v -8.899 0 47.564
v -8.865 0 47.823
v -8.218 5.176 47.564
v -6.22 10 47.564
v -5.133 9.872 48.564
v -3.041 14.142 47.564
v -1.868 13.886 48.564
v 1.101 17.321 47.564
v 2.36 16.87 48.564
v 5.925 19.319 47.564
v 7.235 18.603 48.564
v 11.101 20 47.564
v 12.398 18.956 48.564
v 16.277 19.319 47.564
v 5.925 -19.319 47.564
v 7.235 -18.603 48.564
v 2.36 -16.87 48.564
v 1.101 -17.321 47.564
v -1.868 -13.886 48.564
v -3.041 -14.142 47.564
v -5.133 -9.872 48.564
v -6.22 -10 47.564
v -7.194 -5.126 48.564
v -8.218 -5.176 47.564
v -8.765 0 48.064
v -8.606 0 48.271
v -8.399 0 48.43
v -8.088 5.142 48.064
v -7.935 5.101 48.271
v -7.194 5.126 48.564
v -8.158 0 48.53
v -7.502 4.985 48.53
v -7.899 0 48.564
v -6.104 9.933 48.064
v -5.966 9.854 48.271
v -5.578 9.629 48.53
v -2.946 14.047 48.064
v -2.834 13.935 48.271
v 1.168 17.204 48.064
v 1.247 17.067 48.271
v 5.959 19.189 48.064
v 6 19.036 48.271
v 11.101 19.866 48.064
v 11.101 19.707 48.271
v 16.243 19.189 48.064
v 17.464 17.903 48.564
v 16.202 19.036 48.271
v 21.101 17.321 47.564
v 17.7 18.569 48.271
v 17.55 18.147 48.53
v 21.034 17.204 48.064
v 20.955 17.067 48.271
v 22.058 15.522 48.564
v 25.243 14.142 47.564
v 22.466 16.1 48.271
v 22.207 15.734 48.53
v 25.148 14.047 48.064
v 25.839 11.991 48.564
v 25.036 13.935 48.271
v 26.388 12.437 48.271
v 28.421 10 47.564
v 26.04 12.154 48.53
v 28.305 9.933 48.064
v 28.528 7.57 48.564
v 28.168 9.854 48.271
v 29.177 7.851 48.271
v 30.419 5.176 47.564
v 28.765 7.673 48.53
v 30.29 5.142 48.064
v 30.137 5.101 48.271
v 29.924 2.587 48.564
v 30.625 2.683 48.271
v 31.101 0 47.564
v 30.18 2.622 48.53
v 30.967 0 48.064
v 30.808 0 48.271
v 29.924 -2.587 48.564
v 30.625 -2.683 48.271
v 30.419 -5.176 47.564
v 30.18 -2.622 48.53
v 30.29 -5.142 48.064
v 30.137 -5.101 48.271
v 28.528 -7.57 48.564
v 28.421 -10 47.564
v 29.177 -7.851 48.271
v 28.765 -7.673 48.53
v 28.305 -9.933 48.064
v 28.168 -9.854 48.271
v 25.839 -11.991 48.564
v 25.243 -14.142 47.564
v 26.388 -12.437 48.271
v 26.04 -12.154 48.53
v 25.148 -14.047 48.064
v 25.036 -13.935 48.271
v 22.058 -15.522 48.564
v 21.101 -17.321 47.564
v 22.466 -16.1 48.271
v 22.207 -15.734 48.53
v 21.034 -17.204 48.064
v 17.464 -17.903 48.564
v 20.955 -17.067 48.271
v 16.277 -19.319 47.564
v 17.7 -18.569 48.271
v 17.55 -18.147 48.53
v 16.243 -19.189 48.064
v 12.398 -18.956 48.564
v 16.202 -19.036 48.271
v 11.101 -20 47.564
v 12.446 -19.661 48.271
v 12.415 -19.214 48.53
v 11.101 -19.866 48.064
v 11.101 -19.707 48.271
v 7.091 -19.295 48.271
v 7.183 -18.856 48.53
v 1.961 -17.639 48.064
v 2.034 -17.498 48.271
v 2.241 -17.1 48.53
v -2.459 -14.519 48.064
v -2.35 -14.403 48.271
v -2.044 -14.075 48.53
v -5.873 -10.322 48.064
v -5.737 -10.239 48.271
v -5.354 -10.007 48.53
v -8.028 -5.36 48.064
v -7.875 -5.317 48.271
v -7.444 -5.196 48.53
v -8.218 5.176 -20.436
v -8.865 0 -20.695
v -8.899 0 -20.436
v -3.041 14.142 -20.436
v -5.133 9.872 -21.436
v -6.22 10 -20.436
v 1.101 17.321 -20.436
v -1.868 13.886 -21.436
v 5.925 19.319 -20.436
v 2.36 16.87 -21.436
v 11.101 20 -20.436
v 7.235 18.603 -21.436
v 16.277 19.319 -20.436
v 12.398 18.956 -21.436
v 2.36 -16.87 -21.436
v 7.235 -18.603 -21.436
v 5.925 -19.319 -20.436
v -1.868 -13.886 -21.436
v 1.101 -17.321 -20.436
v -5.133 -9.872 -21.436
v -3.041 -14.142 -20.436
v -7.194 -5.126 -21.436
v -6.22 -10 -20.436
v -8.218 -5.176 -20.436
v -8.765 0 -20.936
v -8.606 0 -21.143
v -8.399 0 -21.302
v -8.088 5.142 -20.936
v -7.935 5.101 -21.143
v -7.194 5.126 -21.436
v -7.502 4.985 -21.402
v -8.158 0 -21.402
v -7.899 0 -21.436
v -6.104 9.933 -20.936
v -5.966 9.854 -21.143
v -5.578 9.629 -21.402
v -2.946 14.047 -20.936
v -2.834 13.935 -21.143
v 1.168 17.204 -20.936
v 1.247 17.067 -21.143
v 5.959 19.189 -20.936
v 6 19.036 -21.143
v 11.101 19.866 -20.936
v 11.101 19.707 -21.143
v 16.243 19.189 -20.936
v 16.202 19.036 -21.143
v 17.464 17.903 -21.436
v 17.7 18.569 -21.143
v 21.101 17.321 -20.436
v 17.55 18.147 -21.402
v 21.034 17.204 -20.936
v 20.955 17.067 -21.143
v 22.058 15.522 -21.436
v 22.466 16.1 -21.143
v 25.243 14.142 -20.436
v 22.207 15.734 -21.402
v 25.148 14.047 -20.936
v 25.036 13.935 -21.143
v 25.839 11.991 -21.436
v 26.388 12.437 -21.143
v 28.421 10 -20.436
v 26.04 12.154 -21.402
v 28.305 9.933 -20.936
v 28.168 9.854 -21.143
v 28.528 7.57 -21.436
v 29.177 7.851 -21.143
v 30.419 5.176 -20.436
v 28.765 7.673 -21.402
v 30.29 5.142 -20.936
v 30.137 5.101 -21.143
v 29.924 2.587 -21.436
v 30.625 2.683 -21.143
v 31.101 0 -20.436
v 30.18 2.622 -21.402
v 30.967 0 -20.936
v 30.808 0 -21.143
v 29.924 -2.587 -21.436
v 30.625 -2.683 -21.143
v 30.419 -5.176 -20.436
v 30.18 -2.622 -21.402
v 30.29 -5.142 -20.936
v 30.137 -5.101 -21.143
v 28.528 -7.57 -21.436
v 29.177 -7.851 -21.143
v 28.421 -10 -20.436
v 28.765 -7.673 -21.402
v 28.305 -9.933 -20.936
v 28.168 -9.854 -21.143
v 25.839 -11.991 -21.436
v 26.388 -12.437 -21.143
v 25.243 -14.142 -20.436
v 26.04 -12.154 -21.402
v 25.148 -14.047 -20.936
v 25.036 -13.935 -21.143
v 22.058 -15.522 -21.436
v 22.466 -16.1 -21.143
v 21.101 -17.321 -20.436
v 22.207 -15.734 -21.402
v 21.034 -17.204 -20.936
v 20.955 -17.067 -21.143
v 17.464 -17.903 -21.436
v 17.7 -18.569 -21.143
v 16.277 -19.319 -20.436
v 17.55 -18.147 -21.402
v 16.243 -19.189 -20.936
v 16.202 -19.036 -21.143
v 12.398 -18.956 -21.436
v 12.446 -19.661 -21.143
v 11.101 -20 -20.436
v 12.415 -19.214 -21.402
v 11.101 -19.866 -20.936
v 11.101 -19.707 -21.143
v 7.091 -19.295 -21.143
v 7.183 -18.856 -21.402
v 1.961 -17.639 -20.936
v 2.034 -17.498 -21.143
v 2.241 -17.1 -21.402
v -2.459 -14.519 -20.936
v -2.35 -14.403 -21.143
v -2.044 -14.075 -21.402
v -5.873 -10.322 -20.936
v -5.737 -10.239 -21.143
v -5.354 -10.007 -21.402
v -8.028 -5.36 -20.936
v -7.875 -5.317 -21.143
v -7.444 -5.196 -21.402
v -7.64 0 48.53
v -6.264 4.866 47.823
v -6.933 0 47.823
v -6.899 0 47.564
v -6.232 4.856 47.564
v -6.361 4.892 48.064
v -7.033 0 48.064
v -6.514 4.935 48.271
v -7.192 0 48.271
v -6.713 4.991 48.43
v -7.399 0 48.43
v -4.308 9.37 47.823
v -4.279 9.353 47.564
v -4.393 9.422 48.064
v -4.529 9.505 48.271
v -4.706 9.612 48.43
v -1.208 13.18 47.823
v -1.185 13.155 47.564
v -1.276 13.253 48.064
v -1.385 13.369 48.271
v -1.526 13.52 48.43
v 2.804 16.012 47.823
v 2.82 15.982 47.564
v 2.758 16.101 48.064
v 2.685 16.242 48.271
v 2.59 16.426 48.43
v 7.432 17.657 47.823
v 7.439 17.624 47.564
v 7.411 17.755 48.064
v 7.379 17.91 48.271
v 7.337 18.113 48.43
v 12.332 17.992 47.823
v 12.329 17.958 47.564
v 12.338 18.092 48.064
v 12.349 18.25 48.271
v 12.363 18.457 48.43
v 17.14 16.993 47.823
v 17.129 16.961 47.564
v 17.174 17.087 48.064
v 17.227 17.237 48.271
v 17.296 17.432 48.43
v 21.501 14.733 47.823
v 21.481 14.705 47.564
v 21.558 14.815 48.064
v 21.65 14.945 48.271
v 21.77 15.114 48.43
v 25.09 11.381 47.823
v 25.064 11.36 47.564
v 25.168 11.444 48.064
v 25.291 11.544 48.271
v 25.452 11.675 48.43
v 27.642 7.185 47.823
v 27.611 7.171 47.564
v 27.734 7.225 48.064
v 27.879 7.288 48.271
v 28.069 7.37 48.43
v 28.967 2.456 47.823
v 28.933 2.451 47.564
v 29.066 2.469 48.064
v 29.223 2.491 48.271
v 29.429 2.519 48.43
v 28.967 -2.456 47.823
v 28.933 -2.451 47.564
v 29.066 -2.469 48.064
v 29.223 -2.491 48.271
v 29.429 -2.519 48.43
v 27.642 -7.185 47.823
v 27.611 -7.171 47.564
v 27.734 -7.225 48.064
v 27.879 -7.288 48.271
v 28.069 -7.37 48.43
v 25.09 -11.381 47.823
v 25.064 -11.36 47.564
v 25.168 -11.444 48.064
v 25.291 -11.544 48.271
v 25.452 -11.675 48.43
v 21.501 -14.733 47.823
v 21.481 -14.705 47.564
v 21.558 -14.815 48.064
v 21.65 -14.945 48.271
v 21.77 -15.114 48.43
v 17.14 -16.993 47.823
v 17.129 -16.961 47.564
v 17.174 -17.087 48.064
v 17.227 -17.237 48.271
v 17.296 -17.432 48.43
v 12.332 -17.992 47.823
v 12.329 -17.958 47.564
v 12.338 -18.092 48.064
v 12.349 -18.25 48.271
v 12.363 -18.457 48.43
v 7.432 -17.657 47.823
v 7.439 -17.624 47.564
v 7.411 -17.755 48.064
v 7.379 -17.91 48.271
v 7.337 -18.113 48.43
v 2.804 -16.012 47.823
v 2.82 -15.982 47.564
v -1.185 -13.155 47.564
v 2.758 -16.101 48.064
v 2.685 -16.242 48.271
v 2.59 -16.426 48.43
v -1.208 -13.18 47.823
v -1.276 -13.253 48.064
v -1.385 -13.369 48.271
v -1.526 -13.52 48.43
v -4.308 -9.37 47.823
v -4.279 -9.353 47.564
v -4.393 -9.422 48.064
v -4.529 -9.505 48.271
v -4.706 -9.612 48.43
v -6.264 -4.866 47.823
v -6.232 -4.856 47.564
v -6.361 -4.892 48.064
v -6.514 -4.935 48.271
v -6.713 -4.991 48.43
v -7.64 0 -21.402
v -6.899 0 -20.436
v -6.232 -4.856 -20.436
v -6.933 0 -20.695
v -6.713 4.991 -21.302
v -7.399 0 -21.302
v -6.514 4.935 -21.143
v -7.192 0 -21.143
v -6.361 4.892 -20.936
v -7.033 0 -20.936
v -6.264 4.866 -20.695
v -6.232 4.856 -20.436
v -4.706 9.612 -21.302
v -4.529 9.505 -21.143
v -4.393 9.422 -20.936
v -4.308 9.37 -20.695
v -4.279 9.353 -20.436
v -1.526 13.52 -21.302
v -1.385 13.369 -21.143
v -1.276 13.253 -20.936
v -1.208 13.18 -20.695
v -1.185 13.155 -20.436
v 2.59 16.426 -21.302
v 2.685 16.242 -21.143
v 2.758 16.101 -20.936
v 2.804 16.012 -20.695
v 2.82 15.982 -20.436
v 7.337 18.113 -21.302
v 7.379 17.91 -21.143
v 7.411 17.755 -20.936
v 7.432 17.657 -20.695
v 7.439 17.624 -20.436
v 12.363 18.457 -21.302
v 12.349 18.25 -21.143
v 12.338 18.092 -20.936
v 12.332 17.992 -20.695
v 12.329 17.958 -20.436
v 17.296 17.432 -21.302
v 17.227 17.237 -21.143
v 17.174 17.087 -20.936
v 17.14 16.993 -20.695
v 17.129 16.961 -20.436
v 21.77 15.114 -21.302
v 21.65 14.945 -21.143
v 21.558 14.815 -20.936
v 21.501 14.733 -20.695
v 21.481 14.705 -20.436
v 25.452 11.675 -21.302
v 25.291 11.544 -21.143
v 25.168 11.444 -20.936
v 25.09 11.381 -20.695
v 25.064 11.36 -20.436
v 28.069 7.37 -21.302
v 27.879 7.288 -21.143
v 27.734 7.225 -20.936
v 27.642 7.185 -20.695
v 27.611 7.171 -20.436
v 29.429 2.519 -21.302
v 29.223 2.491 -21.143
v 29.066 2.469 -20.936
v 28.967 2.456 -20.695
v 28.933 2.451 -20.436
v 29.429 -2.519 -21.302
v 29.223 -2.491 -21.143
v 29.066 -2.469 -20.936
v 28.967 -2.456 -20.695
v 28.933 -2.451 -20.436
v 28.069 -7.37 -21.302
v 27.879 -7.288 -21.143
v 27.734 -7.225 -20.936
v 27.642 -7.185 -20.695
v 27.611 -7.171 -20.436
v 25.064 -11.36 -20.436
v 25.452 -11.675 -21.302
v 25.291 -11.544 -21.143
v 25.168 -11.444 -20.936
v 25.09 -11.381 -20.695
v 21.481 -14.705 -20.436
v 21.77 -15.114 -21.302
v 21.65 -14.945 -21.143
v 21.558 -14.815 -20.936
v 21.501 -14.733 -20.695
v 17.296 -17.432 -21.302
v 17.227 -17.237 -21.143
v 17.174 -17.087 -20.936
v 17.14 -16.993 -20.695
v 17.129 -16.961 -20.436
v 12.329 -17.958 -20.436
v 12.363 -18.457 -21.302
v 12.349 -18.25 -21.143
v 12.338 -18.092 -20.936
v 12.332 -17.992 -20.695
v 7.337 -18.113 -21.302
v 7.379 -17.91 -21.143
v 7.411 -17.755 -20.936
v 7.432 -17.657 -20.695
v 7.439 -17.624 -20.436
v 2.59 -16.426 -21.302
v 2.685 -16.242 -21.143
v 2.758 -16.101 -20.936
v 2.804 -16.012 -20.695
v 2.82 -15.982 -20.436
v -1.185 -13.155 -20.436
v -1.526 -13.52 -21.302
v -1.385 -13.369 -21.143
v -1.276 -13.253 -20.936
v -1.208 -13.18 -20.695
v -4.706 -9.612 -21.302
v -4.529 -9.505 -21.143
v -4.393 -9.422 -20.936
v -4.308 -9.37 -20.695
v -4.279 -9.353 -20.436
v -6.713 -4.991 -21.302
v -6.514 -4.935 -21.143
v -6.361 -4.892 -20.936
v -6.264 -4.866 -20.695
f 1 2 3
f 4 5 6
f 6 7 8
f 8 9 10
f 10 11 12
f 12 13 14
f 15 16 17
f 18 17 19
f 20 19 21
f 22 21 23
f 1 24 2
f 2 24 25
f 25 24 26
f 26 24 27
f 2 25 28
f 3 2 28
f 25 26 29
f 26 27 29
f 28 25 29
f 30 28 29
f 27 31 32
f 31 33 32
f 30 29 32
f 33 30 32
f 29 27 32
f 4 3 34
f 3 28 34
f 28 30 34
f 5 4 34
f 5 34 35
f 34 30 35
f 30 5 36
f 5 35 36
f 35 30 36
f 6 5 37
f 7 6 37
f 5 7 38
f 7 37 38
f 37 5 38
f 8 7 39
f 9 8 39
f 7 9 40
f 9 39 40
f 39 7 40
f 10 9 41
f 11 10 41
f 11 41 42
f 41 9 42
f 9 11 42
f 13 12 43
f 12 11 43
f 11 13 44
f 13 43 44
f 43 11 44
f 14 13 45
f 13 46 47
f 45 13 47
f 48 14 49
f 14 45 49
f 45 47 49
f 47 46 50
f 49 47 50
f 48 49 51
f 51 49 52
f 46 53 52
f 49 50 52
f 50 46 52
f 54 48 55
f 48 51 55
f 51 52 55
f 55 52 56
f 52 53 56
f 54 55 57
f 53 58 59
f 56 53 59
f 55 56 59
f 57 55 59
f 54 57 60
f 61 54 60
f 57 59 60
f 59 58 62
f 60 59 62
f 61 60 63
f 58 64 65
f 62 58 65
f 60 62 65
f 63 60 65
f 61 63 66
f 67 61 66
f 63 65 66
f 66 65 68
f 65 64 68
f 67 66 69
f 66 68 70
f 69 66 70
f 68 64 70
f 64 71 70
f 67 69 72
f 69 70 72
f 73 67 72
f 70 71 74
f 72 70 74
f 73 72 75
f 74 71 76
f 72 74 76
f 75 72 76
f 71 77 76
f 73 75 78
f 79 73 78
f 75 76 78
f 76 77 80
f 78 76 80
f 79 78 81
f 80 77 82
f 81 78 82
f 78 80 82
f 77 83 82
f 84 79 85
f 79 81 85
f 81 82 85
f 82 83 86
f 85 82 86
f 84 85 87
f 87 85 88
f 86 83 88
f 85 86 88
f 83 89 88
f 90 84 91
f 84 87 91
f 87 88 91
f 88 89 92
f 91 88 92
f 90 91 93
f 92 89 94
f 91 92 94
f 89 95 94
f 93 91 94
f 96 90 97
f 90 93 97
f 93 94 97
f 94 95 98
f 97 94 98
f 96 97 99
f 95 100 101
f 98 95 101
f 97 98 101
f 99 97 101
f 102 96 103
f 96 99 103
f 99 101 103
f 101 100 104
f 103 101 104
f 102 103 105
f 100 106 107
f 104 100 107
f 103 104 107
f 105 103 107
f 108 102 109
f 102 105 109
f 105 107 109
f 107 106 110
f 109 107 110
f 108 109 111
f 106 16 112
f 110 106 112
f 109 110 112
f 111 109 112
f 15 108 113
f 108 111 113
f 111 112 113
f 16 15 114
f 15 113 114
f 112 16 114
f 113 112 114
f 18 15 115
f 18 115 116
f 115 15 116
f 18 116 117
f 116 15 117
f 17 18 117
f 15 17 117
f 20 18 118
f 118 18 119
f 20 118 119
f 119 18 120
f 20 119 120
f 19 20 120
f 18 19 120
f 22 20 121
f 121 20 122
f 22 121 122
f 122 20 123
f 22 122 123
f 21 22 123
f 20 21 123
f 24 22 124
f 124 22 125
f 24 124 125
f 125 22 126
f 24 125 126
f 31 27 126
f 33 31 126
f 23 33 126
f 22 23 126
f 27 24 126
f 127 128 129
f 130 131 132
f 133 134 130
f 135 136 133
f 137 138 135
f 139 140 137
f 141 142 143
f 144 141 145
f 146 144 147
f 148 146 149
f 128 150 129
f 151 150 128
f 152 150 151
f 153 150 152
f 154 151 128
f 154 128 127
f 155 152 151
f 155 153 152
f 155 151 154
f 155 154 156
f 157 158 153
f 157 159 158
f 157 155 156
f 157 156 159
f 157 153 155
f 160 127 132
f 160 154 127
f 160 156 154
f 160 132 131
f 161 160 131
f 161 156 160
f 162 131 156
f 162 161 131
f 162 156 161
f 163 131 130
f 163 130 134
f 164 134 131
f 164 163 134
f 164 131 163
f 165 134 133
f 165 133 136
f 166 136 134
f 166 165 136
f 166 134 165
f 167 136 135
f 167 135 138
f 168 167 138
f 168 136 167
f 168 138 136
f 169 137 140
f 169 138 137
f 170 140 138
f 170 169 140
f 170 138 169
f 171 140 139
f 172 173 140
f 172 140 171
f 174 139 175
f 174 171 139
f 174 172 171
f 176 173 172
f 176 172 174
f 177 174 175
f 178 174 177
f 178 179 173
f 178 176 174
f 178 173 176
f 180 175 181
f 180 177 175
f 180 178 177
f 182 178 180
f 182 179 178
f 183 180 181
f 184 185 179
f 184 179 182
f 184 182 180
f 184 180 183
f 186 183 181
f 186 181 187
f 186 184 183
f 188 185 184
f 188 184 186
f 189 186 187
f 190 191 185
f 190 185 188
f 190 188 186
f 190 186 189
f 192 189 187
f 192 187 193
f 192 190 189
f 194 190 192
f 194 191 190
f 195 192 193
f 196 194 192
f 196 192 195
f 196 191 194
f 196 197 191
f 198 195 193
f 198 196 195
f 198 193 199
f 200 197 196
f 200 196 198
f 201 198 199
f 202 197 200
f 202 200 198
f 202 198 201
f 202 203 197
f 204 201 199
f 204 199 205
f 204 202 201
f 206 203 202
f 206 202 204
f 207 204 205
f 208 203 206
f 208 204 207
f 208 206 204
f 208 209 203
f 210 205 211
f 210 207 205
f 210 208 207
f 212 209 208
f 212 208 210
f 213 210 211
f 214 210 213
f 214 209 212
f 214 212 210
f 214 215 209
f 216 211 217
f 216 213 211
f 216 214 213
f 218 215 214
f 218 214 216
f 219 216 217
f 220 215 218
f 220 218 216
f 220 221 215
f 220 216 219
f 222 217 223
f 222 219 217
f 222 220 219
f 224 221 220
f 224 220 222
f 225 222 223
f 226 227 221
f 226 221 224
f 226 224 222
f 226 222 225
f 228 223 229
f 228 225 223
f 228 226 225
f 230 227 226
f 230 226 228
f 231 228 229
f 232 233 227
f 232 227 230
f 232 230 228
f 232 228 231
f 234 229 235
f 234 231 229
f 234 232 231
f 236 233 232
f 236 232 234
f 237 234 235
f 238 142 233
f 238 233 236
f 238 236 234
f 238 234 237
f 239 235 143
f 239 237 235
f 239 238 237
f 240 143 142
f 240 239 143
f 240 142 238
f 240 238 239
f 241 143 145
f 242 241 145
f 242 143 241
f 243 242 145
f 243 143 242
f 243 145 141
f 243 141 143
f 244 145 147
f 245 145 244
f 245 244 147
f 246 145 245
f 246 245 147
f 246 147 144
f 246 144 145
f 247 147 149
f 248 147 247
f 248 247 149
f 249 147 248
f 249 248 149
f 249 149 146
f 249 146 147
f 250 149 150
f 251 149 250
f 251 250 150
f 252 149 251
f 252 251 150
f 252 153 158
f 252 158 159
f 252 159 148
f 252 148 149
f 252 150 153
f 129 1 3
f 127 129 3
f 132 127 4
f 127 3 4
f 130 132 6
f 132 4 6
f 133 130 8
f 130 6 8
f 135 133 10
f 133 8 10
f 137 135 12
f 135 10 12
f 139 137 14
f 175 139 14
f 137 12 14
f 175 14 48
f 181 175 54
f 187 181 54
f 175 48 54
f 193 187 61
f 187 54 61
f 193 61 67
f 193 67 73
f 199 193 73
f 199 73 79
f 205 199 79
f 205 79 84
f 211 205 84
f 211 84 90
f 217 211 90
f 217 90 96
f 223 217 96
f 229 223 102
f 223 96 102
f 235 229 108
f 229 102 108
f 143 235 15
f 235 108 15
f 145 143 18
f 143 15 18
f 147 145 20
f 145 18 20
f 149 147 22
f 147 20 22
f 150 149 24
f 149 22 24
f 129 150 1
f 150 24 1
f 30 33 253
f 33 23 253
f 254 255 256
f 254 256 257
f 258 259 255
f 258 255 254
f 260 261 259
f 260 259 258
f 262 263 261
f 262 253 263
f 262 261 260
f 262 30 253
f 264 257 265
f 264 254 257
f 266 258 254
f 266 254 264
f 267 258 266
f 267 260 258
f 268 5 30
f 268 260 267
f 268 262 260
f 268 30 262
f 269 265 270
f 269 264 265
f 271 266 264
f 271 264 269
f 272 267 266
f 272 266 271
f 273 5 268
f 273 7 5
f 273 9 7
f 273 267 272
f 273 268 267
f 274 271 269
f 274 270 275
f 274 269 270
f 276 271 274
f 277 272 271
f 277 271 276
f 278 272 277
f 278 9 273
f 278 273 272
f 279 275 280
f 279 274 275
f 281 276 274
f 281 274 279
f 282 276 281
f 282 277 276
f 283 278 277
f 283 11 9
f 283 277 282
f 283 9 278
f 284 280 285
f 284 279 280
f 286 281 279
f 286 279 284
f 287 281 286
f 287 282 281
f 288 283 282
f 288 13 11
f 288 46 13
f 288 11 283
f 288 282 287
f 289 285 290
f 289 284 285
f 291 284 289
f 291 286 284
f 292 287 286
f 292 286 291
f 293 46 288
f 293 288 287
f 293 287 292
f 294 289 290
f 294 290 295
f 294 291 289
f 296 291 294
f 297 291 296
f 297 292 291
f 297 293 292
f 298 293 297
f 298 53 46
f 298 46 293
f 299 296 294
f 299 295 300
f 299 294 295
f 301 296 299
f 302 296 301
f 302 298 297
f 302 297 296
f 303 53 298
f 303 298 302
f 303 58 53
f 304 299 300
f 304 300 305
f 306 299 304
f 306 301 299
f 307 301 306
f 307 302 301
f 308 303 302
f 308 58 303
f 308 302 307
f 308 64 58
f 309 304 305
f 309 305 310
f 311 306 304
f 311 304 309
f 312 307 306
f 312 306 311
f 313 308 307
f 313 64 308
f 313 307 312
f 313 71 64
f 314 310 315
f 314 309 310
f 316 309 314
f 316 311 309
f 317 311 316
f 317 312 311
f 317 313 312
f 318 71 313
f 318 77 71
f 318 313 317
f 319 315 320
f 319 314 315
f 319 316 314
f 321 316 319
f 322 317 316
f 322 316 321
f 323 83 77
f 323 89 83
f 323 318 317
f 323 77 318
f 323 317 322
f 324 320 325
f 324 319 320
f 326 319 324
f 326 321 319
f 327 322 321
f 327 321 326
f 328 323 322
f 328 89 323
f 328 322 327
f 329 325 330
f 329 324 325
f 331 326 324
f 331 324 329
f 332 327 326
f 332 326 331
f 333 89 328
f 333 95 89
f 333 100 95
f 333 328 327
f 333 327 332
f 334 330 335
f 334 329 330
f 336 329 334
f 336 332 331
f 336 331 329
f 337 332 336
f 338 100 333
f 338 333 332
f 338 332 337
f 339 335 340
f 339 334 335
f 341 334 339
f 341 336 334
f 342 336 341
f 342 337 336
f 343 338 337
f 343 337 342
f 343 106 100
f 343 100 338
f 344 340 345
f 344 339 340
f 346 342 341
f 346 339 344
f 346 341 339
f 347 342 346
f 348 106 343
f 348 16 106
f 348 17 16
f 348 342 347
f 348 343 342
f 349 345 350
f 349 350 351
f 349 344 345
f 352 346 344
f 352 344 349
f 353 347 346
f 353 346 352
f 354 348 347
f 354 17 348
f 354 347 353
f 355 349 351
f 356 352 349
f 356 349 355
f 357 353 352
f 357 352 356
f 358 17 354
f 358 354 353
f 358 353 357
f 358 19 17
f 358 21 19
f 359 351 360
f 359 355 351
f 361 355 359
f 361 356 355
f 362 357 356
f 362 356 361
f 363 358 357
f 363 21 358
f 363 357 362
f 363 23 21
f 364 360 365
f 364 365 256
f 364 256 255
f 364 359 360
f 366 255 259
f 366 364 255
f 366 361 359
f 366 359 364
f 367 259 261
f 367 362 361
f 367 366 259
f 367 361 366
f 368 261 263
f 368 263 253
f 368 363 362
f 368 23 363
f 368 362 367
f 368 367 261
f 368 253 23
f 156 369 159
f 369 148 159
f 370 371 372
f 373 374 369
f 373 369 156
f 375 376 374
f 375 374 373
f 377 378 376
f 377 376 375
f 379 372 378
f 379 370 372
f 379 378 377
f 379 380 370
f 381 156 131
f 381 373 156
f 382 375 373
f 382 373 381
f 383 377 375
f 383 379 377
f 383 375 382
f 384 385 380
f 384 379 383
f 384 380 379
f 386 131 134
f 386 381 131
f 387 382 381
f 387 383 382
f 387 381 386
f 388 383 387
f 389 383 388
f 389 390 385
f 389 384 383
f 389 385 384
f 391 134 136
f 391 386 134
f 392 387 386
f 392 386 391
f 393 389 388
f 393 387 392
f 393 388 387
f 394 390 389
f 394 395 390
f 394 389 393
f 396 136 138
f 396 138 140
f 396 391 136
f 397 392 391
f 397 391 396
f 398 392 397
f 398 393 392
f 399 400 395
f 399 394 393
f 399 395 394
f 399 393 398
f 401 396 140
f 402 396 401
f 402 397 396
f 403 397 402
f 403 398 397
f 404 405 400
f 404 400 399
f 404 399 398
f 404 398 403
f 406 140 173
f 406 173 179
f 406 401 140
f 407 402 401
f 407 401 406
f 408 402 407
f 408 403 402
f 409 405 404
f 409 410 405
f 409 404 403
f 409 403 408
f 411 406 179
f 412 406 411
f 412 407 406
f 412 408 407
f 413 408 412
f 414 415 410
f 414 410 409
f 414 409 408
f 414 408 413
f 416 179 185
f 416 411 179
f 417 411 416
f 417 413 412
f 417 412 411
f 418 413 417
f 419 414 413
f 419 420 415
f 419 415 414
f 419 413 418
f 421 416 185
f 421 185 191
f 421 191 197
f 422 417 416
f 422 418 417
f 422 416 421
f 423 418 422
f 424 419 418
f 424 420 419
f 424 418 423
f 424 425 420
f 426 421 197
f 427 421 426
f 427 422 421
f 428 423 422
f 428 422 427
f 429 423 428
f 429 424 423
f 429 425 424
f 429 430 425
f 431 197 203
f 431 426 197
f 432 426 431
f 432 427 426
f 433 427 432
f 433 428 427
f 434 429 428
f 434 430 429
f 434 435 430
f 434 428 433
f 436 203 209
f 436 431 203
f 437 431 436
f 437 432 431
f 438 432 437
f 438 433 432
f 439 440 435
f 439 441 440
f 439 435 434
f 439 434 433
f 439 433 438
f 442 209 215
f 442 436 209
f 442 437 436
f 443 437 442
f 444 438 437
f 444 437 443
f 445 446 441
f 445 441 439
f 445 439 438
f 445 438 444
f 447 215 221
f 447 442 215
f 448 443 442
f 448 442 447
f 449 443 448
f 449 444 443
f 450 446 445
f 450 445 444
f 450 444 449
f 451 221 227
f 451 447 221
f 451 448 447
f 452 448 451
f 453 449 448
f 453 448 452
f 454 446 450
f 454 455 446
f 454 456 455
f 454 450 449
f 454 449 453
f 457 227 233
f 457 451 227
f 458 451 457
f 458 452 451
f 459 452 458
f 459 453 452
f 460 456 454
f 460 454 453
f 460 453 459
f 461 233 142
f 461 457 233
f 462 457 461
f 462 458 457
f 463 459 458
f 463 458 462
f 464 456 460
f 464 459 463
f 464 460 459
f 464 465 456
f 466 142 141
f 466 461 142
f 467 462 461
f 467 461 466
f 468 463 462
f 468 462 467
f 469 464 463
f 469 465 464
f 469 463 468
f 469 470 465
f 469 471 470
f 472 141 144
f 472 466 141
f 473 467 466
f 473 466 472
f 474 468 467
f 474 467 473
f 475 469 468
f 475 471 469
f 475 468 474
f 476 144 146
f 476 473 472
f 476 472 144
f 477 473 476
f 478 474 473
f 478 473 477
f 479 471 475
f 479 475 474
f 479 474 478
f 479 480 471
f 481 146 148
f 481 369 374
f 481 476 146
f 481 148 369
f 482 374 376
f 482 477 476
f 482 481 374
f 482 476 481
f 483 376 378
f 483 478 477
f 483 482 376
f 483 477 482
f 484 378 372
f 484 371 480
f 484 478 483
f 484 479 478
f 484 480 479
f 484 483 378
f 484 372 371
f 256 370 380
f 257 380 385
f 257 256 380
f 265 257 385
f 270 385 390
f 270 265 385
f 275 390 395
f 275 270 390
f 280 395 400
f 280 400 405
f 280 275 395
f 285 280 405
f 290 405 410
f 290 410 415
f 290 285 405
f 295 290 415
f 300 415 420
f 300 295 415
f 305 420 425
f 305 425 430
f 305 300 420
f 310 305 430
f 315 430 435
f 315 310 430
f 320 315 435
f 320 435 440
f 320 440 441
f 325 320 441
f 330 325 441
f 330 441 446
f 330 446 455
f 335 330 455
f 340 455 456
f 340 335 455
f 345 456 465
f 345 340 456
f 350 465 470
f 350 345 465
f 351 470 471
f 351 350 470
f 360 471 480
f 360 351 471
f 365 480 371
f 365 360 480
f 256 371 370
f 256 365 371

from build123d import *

# Parameters (mm, degrees)
F0_W = 2
F0_H = 70
F2_R = 0.99999


# Not quite as in the source:
# - a fillet or chamfer is up to 0.001 mm smaller than in the source, because OpenCascade refuses the exact size


with BuildPart() as f1:
    # F0 (on Front) → F1 (revolve)
    with BuildSketch(Plane.XZ):
        with Locations((-7.899047263, 13.5642557819)):
            Rectangle(F0_W, F0_H)
    revolve(axis=Axis((11.100952737, 0, 13.5642557819), (0, 0, -1)))

    # F2 (radius 1 in the source; OpenCascade refuses exactly that, so slightly less here)
    f2_edges = [f1.edges().sort_by_distance(p)[0] for p in [
        (29.100953, 0, 48.564256),
        (31.100953, 0, 48.564256),
        (31.100953, 0, -21.435744),
        (29.100953, 0, -21.435744),
    ]]
    fillet(f2_edges, radius=F2_R)


solid = f1.part
